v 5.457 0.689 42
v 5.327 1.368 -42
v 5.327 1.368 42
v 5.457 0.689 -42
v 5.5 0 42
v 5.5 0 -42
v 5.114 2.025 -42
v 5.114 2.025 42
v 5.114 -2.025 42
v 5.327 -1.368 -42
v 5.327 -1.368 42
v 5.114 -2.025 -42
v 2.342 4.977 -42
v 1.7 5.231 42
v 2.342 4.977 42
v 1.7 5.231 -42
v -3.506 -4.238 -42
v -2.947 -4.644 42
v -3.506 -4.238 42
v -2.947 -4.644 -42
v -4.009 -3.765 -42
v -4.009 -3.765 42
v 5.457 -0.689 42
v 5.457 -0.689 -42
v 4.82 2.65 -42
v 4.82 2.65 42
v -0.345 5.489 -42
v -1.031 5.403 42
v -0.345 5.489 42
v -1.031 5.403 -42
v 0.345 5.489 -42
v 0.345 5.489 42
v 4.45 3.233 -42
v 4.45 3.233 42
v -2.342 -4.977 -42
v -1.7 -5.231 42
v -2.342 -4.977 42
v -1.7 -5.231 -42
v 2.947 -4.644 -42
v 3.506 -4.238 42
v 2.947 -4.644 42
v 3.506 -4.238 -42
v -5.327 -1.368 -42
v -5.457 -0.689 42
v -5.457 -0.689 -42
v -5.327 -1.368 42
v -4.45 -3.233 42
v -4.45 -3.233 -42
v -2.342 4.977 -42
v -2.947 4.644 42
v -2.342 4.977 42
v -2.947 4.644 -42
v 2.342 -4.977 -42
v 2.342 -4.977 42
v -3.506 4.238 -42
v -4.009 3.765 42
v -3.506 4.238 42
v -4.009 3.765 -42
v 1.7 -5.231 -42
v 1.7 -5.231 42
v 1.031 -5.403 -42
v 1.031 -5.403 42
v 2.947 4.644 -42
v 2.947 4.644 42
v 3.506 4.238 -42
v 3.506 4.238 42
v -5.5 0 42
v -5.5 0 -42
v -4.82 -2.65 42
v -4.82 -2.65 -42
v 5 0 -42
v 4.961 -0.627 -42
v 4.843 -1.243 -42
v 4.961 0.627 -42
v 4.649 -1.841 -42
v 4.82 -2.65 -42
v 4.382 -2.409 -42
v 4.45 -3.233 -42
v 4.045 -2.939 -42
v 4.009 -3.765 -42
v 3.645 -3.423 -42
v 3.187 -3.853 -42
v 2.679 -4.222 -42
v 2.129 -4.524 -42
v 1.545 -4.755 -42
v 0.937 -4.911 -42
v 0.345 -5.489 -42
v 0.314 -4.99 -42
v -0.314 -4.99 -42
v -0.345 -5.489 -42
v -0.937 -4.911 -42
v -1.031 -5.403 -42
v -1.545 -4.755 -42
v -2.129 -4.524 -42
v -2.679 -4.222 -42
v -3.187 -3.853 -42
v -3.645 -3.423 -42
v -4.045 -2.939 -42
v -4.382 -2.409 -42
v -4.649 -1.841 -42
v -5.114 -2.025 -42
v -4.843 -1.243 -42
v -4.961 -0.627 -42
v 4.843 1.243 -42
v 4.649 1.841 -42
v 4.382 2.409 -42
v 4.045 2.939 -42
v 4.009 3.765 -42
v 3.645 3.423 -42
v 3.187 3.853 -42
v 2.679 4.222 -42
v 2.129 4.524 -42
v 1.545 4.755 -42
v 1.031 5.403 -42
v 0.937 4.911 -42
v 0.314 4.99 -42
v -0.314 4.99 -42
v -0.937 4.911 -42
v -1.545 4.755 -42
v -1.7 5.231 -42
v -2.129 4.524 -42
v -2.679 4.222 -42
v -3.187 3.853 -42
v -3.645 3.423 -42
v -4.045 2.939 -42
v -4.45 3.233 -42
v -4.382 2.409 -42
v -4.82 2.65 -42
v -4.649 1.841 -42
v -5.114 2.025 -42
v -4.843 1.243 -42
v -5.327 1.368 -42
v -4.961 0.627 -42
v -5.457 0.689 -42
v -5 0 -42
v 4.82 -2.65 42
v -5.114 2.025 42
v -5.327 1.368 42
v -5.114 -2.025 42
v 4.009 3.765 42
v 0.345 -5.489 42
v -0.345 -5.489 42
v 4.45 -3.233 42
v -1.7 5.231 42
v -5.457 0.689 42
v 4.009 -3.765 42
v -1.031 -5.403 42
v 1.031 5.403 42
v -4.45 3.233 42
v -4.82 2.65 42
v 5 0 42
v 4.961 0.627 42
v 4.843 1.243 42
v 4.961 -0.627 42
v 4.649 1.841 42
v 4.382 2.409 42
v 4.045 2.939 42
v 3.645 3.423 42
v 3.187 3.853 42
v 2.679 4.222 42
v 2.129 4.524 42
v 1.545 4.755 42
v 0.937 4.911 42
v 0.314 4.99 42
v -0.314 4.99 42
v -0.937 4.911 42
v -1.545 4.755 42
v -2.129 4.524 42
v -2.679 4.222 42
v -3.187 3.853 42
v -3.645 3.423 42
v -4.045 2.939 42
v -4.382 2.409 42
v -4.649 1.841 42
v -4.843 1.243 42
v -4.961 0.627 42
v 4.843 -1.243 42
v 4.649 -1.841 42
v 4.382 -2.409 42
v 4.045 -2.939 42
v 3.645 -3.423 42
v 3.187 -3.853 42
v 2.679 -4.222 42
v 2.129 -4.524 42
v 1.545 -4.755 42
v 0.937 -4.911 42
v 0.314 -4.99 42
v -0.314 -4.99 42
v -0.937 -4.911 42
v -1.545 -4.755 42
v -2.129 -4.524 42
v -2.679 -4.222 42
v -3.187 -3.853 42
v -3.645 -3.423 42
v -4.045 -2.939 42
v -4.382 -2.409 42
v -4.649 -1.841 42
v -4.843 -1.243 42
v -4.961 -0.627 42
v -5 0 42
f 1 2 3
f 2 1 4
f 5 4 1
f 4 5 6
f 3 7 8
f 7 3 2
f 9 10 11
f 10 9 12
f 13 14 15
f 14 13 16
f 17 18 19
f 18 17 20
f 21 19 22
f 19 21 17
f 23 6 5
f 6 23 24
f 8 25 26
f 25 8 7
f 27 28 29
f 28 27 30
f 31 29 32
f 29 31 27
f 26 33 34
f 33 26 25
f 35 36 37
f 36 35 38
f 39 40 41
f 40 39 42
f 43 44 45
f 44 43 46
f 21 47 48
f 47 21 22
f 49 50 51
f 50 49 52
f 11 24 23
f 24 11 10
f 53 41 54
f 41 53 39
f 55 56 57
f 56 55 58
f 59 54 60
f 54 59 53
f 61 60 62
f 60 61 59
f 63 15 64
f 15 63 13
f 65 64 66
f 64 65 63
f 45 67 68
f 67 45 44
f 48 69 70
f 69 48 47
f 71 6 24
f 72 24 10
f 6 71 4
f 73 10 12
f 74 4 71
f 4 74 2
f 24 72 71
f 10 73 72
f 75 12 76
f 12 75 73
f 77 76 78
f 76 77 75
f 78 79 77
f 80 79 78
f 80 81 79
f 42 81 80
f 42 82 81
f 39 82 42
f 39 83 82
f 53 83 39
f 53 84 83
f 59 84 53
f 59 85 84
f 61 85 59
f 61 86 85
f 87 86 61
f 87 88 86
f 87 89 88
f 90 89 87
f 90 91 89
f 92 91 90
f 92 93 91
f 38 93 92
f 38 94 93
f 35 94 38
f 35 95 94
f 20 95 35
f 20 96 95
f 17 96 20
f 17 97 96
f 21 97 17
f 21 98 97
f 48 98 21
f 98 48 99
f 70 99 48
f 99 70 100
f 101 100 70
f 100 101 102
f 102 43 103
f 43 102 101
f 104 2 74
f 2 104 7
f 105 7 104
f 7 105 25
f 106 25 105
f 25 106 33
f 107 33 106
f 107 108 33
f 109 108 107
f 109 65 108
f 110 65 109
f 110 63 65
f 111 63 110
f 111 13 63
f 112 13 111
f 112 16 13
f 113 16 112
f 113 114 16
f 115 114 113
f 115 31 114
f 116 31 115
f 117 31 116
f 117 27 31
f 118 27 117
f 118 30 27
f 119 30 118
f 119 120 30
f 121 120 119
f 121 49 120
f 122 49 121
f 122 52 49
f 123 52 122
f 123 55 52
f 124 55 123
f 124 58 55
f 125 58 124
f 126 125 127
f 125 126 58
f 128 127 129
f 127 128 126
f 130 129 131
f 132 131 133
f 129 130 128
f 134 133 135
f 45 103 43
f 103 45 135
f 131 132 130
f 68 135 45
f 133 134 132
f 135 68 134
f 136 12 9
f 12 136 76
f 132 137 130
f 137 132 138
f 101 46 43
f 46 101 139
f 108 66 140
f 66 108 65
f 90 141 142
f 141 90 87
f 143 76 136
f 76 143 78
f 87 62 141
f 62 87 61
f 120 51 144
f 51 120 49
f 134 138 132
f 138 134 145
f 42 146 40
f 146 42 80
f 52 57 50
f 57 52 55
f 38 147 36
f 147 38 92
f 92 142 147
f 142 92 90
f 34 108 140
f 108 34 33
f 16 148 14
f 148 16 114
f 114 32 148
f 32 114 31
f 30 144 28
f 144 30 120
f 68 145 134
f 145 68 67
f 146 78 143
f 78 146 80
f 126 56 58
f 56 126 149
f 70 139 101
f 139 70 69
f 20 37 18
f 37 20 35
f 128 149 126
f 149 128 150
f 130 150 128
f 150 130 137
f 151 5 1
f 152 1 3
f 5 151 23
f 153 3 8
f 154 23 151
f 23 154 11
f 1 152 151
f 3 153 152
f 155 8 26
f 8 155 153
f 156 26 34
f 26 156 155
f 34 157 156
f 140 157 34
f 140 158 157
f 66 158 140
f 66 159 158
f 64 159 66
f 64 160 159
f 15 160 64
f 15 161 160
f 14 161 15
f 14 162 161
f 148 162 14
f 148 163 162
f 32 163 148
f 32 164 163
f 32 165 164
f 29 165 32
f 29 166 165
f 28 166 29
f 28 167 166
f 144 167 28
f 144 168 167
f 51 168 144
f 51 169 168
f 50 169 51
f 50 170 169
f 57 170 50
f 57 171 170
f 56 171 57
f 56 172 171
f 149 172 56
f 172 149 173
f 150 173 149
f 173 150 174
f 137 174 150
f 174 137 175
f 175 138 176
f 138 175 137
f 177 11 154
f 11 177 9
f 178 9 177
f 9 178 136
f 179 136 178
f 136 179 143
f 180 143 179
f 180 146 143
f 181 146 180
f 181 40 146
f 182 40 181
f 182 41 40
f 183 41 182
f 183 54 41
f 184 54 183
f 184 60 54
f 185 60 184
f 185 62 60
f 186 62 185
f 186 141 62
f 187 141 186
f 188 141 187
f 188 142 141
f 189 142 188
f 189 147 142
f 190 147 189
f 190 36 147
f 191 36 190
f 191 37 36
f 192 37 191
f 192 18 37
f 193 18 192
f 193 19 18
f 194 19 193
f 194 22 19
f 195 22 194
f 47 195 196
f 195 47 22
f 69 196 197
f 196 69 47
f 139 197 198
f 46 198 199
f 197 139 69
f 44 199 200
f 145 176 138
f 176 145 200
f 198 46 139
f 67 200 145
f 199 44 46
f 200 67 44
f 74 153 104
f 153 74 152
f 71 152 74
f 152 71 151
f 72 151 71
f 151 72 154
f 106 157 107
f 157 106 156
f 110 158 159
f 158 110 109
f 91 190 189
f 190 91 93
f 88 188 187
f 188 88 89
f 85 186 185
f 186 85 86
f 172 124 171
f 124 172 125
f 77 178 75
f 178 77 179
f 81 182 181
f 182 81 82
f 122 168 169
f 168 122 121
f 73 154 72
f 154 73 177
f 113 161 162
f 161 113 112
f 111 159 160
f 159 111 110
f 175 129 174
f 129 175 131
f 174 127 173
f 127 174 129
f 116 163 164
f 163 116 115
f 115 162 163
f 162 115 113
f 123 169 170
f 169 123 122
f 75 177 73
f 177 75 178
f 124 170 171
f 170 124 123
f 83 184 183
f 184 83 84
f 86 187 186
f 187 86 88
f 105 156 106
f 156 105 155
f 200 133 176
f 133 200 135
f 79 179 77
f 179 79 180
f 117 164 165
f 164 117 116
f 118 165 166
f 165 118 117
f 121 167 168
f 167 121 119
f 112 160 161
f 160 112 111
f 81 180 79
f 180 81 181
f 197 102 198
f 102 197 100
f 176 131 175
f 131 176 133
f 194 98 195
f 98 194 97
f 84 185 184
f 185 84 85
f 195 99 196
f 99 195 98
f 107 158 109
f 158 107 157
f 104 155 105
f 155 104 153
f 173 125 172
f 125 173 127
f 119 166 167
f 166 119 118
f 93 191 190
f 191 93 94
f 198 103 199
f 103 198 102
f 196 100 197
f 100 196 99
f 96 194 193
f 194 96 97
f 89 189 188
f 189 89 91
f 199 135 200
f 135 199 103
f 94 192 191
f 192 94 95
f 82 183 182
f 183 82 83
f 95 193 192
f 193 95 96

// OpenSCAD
$fn = 50;


difference() {
	union() {
		translate(v = [0, 0, -42.0000000000]) {
			cylinder(h = 84, r = 5.5000000000);
		}
	}
	union() {
		translate(v = [0, 0, -100.0000000000]) {
			cylinder(h = 200, r = 5.0000000000);
		}
	}
}
